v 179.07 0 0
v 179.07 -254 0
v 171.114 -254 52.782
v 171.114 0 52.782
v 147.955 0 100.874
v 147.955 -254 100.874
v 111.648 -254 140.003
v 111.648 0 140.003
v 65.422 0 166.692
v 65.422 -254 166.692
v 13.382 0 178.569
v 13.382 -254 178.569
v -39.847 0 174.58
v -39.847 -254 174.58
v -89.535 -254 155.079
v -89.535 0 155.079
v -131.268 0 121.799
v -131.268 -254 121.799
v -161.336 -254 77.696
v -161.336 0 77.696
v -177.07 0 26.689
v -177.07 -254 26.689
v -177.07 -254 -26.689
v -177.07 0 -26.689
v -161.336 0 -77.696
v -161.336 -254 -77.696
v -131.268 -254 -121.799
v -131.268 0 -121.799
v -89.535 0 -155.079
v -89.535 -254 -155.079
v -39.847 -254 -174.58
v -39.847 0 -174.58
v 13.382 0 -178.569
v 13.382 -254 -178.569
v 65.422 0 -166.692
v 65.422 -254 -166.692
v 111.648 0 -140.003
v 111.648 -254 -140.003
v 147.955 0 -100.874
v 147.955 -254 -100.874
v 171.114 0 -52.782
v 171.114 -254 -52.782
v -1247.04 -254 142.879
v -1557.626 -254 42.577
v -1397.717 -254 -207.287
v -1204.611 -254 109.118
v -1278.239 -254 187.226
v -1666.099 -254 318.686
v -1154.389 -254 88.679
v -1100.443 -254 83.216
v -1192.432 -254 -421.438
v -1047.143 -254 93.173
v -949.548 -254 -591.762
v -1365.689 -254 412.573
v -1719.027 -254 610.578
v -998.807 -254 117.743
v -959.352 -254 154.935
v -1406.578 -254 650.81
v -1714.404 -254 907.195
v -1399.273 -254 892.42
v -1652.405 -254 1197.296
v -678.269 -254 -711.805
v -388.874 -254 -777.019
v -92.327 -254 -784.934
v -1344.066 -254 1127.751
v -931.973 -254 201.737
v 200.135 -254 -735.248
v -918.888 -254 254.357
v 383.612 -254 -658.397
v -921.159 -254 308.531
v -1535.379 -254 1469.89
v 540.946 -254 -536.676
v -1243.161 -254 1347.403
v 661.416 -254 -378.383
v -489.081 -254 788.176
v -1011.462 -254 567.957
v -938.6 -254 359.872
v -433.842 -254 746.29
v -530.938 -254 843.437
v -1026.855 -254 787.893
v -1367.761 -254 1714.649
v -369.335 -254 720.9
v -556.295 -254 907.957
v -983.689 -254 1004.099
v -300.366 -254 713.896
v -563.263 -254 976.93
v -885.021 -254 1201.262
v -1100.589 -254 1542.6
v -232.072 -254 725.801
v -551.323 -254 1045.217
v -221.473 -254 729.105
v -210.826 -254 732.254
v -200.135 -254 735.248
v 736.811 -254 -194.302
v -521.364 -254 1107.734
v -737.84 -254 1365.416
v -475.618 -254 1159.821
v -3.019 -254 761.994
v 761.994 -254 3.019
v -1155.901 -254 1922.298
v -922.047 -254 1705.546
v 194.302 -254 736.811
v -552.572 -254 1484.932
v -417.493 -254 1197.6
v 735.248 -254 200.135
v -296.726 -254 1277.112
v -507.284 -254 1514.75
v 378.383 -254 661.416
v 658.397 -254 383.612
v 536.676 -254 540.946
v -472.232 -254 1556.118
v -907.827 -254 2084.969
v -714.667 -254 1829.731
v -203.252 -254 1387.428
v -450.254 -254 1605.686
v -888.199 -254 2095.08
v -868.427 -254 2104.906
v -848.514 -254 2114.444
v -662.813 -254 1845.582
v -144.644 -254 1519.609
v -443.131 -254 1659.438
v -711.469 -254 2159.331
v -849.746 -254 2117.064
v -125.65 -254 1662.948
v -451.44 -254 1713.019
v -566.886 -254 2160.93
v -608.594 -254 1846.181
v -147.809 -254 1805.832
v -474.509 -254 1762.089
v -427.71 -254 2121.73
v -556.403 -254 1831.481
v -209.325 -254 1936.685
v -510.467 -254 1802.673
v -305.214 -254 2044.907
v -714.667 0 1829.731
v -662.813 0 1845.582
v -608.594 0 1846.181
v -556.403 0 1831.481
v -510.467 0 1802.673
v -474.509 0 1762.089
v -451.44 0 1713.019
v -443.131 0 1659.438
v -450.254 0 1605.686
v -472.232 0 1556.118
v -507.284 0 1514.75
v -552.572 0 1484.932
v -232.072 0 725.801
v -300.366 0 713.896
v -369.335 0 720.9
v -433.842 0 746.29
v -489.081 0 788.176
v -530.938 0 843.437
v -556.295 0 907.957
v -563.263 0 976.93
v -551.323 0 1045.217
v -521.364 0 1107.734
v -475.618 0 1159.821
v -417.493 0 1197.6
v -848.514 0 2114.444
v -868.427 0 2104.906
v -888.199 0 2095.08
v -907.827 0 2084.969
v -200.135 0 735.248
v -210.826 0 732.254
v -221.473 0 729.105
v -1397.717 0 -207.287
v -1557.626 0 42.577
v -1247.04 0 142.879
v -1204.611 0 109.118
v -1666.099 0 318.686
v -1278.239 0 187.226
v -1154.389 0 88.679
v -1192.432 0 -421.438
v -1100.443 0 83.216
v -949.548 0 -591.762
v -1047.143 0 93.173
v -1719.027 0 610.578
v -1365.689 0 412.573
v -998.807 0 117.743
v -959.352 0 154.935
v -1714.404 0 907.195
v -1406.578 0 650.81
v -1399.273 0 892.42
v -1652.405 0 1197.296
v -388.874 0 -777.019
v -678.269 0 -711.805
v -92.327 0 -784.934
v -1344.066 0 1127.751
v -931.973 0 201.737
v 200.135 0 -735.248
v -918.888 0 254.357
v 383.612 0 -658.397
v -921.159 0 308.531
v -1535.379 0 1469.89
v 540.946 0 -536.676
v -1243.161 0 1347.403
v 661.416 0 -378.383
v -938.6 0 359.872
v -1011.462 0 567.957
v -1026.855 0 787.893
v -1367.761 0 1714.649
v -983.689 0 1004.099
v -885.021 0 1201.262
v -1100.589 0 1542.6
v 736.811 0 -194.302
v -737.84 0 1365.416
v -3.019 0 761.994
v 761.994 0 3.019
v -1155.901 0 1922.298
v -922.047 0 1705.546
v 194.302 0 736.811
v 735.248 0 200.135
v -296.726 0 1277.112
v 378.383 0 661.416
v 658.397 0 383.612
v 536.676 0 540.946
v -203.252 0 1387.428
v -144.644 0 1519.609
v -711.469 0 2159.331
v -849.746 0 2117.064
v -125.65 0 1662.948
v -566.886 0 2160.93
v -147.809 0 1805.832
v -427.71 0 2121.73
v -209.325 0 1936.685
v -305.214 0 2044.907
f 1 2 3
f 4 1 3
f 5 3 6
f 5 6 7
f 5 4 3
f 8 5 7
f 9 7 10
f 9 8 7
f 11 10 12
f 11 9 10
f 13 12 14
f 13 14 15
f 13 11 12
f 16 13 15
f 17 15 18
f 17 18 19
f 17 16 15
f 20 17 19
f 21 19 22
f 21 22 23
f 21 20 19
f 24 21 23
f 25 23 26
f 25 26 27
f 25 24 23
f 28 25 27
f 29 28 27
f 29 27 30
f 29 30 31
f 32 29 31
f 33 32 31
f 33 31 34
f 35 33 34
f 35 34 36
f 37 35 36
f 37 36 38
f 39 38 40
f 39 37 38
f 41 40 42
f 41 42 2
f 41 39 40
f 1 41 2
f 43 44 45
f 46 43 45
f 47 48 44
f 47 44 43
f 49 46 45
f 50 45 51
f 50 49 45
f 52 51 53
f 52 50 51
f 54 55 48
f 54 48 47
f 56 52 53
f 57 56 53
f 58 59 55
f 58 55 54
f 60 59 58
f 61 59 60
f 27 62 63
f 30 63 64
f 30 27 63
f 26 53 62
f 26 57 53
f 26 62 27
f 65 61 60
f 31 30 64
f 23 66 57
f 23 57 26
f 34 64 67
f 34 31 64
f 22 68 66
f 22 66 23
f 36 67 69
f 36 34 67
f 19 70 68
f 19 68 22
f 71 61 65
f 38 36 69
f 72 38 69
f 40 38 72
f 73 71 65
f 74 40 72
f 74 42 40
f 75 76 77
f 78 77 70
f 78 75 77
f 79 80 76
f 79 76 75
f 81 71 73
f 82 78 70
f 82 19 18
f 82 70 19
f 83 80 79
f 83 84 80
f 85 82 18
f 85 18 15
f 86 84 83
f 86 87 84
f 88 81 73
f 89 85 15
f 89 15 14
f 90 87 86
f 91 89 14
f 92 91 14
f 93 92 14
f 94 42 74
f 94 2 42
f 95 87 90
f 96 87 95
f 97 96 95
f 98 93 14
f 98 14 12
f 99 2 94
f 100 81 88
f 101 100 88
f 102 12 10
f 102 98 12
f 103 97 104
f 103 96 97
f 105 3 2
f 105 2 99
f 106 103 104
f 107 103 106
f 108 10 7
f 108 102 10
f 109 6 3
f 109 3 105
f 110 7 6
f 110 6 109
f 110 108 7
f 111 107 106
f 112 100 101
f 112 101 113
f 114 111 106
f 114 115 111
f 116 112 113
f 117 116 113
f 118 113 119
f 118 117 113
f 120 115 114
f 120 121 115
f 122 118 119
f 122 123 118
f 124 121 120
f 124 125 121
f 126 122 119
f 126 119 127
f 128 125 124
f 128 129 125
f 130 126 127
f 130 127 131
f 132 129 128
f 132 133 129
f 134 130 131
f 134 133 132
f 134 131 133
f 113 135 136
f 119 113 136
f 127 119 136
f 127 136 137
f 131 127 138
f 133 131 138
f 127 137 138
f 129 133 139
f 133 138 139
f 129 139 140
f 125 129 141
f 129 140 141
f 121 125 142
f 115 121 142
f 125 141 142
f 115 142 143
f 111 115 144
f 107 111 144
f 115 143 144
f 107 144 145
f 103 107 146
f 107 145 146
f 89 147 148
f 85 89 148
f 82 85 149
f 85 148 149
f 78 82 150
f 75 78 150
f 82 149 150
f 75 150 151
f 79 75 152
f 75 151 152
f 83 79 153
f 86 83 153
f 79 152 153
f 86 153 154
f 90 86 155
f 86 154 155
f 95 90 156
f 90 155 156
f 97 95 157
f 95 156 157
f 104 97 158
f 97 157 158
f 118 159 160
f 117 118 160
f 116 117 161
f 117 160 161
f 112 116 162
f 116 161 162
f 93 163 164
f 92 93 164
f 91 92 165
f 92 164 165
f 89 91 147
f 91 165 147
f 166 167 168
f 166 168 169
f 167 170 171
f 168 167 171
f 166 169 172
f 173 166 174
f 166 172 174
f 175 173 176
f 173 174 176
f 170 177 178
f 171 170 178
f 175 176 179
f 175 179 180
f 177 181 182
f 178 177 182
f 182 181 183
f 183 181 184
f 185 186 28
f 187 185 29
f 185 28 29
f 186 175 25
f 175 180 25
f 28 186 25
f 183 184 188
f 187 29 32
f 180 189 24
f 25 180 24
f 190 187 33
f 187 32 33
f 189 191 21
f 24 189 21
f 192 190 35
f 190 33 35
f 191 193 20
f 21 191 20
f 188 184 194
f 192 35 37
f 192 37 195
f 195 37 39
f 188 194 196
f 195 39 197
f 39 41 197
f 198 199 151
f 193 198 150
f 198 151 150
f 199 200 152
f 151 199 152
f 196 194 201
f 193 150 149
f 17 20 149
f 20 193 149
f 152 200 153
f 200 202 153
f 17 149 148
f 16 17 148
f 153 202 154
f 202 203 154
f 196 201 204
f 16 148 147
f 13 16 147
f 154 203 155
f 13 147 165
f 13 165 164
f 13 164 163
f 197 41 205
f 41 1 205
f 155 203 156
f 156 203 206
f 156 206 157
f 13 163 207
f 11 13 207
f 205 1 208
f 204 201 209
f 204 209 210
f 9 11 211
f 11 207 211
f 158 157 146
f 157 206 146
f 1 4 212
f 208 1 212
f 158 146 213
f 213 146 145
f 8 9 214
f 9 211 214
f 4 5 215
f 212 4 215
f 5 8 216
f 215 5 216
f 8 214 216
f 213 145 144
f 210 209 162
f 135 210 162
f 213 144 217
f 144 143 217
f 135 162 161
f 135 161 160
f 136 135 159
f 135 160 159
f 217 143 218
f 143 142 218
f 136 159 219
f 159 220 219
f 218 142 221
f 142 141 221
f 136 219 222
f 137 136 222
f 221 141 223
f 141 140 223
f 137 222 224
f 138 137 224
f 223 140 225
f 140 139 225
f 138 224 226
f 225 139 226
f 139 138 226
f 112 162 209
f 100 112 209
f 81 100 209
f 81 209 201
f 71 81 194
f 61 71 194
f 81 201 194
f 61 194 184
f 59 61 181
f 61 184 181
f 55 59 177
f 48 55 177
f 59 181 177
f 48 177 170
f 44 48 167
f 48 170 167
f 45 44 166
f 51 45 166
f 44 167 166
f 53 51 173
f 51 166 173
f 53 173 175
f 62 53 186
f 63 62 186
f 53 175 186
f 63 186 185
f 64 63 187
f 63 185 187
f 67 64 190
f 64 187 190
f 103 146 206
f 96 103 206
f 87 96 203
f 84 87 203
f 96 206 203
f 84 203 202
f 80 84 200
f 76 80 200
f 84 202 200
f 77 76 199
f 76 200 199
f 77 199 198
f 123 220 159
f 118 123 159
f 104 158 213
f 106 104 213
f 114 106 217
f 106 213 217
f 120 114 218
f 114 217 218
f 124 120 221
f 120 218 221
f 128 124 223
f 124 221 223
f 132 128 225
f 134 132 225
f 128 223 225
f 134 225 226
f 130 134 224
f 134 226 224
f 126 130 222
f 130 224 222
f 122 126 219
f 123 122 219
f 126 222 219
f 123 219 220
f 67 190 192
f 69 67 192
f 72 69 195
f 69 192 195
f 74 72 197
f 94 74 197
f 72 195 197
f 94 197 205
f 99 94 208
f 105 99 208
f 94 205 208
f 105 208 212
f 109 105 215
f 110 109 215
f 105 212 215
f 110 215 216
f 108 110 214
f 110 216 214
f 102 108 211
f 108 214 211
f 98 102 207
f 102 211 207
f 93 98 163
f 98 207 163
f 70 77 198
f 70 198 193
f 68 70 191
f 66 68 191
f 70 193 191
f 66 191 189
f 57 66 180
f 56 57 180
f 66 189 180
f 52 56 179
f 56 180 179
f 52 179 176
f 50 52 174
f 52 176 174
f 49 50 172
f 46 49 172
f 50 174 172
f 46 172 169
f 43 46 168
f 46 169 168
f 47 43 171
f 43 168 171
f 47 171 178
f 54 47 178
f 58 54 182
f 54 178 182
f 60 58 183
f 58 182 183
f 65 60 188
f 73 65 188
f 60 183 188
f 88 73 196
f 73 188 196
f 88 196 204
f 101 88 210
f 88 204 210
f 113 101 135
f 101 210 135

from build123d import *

# Parameters (mm, degrees)
F0_R     = 179.07
F1_DEPTH = 254


with BuildPart() as f1:
    # F0 (on Front) → F1 (new body)
    with BuildSketch(Plane.XZ):
        with BuildLine():
            ThreePointArc((-907.827361, 2084.969433), (-1618.596621, 177.985708), (200.134651, -735.24834))
            ThreePointArc((200.134651, -735.24834), (735.24834, 200.134651), (-200.134651, 735.24834))
            ThreePointArc((-200.134651, 735.24834), (-216.155012, 730.698988), (-232.072124, 725.800613))
            ThreePointArc((-232.072124, 725.800613), (-545.828305, 874.827721), (-417.492703, 1197.600076))
            ThreePointArc((-417.492703, 1197.600076), (-173.887257, 1873.458336), (-849.745517, 2117.063781))
            Line((-849.745517, 2117.063781), (-848.513872, 2114.443897))
            ThreePointArc((-848.513872, 2114.443897), (-878.330756, 2100.028924), (-907.827361, 2084.969433))
        make_face()
        Circle(F0_R, mode=Mode.SUBTRACT)
        with BuildLine():
            ThreePointArc((-714.666512, 1829.731373), (-461.219665, 1738.379331), (-552.571707, 1484.932484))
            ThreePointArc((-552.571707, 1484.932484), (-983.688925, 1004.099403), (-938.599611, 359.8716))
            ThreePointArc((-938.599611, 359.8716), (-1022.096385, 103.729474), (-1278.238511, 187.226248))
            ThreePointArc((-1278.238511, 187.226248), (-1344.065553, 1127.750874), (-714.666512, 1829.731373))
        make_face(mode=Mode.SUBTRACT)
    extrude(amount=F1_DEPTH)


solid = f1.part
